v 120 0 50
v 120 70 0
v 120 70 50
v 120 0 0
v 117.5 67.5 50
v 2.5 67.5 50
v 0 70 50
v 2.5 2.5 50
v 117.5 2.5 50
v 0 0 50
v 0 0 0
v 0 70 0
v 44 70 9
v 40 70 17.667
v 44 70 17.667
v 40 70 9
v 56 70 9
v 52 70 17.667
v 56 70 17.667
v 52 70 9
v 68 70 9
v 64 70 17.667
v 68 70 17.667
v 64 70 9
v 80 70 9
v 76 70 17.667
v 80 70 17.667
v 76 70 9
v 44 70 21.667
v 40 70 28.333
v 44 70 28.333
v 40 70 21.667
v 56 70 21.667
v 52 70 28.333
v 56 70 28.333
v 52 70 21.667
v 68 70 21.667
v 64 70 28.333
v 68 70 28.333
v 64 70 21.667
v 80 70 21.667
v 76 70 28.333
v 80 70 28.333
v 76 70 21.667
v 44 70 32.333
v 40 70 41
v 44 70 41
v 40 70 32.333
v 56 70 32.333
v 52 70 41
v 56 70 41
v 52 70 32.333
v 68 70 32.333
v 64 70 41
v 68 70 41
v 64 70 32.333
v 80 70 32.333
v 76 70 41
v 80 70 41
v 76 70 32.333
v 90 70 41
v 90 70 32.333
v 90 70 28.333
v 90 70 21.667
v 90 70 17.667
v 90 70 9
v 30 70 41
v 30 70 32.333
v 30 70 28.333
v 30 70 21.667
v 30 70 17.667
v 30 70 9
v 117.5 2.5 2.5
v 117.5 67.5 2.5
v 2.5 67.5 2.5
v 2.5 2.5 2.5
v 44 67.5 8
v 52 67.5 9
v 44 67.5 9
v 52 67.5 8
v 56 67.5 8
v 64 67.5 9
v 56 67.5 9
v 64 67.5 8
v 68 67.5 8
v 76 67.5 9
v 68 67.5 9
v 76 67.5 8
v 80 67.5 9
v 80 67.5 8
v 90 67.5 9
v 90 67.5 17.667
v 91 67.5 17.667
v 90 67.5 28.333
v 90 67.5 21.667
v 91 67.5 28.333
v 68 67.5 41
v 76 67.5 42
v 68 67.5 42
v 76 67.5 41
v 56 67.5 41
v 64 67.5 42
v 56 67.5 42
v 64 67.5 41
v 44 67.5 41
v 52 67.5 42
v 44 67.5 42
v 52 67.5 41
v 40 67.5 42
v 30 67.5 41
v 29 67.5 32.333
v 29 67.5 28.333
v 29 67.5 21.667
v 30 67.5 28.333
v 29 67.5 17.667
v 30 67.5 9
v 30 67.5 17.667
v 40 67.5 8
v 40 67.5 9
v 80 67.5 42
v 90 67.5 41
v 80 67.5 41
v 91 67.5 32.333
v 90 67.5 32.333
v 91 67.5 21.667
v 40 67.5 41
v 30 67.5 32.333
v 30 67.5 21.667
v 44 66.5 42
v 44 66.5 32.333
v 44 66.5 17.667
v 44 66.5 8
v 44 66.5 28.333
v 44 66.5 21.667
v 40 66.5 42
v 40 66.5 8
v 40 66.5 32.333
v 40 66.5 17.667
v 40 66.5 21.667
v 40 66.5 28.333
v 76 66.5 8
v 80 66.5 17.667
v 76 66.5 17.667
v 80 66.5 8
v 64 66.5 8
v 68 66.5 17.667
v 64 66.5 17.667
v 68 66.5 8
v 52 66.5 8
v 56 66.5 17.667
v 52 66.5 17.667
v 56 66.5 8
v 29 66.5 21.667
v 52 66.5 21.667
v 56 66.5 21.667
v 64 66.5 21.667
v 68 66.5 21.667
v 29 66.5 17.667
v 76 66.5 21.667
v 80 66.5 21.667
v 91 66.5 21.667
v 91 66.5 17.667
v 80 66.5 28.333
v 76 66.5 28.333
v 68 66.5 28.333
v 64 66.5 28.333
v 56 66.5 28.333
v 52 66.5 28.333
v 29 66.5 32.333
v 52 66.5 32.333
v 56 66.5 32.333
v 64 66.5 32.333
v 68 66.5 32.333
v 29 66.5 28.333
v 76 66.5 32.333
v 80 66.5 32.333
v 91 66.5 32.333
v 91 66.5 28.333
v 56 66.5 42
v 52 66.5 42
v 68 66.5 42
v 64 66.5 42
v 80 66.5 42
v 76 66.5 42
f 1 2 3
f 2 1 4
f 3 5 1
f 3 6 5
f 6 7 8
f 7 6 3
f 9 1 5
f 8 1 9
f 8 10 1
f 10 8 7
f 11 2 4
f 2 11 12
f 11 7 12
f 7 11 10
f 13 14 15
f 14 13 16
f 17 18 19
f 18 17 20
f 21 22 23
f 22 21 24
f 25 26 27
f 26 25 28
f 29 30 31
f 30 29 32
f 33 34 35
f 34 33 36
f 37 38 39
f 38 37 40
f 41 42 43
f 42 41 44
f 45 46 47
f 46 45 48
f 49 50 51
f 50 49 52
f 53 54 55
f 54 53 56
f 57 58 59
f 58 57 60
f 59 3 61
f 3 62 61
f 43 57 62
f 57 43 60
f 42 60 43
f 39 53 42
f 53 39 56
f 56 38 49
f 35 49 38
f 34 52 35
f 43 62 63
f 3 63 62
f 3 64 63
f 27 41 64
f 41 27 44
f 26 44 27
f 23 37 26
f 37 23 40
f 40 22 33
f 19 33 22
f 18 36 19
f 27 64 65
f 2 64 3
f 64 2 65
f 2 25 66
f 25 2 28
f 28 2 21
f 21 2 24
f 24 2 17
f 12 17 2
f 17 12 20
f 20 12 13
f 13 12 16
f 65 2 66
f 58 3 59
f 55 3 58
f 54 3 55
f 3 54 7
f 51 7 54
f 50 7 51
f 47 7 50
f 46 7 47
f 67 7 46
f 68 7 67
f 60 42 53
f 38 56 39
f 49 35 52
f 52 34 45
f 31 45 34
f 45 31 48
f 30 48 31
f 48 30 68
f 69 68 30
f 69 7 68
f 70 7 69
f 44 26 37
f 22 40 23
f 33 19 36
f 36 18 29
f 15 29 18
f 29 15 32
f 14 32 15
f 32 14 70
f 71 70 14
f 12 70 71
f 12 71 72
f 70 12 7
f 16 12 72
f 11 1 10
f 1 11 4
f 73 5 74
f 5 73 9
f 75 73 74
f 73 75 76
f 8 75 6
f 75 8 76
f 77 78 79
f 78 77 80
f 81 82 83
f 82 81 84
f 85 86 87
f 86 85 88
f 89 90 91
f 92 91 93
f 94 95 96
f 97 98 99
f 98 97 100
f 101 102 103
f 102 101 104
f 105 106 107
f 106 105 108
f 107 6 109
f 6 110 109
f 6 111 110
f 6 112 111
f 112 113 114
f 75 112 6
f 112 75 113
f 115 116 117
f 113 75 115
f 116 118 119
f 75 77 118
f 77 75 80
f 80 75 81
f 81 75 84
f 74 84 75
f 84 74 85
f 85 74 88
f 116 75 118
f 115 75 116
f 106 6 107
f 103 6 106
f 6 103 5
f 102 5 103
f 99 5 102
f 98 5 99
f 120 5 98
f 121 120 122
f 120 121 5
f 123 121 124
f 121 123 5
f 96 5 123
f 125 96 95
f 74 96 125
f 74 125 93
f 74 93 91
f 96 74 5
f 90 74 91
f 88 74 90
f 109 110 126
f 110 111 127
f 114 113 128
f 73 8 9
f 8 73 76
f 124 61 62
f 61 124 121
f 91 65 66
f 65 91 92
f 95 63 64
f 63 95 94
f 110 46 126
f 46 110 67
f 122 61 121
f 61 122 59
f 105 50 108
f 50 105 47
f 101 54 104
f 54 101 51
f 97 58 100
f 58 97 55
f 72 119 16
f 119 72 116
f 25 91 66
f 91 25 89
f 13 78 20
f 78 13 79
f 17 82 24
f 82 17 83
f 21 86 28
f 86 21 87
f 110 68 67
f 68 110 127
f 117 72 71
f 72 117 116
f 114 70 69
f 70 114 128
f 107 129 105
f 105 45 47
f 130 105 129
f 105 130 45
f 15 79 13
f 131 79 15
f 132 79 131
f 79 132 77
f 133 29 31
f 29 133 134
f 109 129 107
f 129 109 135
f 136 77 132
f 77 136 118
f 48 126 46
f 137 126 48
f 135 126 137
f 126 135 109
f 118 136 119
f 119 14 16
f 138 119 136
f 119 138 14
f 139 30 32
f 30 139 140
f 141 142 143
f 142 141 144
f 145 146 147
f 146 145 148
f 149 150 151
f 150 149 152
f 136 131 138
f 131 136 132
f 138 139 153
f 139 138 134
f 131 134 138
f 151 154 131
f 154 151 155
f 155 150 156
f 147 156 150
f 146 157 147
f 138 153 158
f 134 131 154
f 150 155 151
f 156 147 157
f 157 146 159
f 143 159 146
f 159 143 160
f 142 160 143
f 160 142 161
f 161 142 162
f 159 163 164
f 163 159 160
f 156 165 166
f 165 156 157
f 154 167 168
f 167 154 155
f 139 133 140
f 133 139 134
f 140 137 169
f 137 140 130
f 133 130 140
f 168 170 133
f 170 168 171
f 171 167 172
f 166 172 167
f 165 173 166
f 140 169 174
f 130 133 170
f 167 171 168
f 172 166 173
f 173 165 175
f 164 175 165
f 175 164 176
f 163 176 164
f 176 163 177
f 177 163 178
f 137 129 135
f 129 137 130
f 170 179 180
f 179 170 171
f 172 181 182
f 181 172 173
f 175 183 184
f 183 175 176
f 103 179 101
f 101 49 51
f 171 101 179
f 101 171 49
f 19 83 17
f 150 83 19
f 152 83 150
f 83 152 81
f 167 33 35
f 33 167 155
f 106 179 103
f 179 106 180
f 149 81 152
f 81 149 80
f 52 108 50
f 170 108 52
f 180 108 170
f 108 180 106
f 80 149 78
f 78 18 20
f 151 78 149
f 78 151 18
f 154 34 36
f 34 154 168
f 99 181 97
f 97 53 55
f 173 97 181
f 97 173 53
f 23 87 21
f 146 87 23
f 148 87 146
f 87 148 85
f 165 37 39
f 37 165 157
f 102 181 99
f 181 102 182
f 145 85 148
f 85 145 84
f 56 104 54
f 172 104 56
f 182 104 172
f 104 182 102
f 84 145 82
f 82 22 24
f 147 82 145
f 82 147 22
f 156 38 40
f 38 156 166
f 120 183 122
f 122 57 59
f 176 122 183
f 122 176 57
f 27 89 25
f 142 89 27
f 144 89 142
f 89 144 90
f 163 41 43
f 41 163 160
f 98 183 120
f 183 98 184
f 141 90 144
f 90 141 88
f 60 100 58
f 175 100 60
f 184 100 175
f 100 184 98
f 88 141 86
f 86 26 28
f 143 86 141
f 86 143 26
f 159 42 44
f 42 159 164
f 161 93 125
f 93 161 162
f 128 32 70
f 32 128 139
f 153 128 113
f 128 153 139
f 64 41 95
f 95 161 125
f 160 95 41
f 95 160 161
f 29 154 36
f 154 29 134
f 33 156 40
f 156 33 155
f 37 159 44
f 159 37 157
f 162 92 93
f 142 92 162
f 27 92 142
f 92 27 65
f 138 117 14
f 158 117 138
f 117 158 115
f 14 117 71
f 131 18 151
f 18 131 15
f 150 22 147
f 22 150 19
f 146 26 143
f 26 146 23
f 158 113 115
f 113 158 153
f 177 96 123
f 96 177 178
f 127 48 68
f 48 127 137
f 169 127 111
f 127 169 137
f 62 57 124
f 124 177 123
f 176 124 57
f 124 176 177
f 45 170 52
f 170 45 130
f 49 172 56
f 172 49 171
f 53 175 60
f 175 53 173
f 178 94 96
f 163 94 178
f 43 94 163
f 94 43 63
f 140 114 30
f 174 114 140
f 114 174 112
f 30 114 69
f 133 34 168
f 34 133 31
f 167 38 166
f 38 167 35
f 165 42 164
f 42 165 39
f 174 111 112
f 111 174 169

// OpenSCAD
$fn = 32;

// ----------------------------------------------------------------------
// Vent box: crossgrid enclosure
// ----------------------------------------------------------------------

// --- parameters (mm) ---
box_l = 120;              // box length, X
box_w = 70;               // box width, Y
box_h = 50;               // box height, Z
wall_t = 2.5;             // shell wall thickness
win_l = 60;               // vent window width, X
win_h = 32;               // vent window height, Z
bar_w = 4;                // grid bar width
n_v = 4;                  // vertical bar count
n_h = 2;                  // horizontal bar count

win_z0 = (box_h - win_h) / 2;  // window lower edge Z
v_step = win_l / (n_v + 1);  // vertical bar step
h_step = win_h / (n_h + 1);  // horizontal bar step

difference() {
  union() {
    difference() {
      cube([box_l, box_w, box_h]);
  translate([wall_t, wall_t, wall_t])
    cube([box_l - 2 * wall_t, box_w - 2 * wall_t, box_h]);
  translate([(box_l - win_l) / 2, box_w - wall_t - 1, win_z0])
    cube([win_l, wall_t + 2, win_h]);
    }
    for (i = [1 : n_v])
      translate([(box_l - win_l) / 2 + i * v_step - bar_w / 2,
                 box_w - wall_t - 1, win_z0 - 1])
        cube([bar_w, wall_t + 1, win_h + 2]);
    for (i = [1 : n_h])
      translate([(box_l - win_l) / 2 - 1, box_w - wall_t - 1,
                 win_z0 + i * h_step - bar_w / 2])
        cube([win_l + 2, wall_t + 1, bar_w]);
  }
}
